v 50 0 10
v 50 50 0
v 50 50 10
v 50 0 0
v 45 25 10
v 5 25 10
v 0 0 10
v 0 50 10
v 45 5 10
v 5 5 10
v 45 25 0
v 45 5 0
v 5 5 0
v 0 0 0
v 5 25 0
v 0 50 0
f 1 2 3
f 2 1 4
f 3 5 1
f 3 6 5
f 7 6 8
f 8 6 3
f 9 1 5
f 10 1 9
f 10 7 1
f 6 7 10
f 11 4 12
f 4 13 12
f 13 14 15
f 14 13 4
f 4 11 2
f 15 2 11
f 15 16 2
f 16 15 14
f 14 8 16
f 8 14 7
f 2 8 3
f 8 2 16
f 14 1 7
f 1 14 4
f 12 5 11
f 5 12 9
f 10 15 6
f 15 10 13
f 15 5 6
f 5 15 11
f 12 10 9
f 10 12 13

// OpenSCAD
difference()
{
	cube([50,50,10]);
	translate([5,5,0])cube([40,20,10]);
}
